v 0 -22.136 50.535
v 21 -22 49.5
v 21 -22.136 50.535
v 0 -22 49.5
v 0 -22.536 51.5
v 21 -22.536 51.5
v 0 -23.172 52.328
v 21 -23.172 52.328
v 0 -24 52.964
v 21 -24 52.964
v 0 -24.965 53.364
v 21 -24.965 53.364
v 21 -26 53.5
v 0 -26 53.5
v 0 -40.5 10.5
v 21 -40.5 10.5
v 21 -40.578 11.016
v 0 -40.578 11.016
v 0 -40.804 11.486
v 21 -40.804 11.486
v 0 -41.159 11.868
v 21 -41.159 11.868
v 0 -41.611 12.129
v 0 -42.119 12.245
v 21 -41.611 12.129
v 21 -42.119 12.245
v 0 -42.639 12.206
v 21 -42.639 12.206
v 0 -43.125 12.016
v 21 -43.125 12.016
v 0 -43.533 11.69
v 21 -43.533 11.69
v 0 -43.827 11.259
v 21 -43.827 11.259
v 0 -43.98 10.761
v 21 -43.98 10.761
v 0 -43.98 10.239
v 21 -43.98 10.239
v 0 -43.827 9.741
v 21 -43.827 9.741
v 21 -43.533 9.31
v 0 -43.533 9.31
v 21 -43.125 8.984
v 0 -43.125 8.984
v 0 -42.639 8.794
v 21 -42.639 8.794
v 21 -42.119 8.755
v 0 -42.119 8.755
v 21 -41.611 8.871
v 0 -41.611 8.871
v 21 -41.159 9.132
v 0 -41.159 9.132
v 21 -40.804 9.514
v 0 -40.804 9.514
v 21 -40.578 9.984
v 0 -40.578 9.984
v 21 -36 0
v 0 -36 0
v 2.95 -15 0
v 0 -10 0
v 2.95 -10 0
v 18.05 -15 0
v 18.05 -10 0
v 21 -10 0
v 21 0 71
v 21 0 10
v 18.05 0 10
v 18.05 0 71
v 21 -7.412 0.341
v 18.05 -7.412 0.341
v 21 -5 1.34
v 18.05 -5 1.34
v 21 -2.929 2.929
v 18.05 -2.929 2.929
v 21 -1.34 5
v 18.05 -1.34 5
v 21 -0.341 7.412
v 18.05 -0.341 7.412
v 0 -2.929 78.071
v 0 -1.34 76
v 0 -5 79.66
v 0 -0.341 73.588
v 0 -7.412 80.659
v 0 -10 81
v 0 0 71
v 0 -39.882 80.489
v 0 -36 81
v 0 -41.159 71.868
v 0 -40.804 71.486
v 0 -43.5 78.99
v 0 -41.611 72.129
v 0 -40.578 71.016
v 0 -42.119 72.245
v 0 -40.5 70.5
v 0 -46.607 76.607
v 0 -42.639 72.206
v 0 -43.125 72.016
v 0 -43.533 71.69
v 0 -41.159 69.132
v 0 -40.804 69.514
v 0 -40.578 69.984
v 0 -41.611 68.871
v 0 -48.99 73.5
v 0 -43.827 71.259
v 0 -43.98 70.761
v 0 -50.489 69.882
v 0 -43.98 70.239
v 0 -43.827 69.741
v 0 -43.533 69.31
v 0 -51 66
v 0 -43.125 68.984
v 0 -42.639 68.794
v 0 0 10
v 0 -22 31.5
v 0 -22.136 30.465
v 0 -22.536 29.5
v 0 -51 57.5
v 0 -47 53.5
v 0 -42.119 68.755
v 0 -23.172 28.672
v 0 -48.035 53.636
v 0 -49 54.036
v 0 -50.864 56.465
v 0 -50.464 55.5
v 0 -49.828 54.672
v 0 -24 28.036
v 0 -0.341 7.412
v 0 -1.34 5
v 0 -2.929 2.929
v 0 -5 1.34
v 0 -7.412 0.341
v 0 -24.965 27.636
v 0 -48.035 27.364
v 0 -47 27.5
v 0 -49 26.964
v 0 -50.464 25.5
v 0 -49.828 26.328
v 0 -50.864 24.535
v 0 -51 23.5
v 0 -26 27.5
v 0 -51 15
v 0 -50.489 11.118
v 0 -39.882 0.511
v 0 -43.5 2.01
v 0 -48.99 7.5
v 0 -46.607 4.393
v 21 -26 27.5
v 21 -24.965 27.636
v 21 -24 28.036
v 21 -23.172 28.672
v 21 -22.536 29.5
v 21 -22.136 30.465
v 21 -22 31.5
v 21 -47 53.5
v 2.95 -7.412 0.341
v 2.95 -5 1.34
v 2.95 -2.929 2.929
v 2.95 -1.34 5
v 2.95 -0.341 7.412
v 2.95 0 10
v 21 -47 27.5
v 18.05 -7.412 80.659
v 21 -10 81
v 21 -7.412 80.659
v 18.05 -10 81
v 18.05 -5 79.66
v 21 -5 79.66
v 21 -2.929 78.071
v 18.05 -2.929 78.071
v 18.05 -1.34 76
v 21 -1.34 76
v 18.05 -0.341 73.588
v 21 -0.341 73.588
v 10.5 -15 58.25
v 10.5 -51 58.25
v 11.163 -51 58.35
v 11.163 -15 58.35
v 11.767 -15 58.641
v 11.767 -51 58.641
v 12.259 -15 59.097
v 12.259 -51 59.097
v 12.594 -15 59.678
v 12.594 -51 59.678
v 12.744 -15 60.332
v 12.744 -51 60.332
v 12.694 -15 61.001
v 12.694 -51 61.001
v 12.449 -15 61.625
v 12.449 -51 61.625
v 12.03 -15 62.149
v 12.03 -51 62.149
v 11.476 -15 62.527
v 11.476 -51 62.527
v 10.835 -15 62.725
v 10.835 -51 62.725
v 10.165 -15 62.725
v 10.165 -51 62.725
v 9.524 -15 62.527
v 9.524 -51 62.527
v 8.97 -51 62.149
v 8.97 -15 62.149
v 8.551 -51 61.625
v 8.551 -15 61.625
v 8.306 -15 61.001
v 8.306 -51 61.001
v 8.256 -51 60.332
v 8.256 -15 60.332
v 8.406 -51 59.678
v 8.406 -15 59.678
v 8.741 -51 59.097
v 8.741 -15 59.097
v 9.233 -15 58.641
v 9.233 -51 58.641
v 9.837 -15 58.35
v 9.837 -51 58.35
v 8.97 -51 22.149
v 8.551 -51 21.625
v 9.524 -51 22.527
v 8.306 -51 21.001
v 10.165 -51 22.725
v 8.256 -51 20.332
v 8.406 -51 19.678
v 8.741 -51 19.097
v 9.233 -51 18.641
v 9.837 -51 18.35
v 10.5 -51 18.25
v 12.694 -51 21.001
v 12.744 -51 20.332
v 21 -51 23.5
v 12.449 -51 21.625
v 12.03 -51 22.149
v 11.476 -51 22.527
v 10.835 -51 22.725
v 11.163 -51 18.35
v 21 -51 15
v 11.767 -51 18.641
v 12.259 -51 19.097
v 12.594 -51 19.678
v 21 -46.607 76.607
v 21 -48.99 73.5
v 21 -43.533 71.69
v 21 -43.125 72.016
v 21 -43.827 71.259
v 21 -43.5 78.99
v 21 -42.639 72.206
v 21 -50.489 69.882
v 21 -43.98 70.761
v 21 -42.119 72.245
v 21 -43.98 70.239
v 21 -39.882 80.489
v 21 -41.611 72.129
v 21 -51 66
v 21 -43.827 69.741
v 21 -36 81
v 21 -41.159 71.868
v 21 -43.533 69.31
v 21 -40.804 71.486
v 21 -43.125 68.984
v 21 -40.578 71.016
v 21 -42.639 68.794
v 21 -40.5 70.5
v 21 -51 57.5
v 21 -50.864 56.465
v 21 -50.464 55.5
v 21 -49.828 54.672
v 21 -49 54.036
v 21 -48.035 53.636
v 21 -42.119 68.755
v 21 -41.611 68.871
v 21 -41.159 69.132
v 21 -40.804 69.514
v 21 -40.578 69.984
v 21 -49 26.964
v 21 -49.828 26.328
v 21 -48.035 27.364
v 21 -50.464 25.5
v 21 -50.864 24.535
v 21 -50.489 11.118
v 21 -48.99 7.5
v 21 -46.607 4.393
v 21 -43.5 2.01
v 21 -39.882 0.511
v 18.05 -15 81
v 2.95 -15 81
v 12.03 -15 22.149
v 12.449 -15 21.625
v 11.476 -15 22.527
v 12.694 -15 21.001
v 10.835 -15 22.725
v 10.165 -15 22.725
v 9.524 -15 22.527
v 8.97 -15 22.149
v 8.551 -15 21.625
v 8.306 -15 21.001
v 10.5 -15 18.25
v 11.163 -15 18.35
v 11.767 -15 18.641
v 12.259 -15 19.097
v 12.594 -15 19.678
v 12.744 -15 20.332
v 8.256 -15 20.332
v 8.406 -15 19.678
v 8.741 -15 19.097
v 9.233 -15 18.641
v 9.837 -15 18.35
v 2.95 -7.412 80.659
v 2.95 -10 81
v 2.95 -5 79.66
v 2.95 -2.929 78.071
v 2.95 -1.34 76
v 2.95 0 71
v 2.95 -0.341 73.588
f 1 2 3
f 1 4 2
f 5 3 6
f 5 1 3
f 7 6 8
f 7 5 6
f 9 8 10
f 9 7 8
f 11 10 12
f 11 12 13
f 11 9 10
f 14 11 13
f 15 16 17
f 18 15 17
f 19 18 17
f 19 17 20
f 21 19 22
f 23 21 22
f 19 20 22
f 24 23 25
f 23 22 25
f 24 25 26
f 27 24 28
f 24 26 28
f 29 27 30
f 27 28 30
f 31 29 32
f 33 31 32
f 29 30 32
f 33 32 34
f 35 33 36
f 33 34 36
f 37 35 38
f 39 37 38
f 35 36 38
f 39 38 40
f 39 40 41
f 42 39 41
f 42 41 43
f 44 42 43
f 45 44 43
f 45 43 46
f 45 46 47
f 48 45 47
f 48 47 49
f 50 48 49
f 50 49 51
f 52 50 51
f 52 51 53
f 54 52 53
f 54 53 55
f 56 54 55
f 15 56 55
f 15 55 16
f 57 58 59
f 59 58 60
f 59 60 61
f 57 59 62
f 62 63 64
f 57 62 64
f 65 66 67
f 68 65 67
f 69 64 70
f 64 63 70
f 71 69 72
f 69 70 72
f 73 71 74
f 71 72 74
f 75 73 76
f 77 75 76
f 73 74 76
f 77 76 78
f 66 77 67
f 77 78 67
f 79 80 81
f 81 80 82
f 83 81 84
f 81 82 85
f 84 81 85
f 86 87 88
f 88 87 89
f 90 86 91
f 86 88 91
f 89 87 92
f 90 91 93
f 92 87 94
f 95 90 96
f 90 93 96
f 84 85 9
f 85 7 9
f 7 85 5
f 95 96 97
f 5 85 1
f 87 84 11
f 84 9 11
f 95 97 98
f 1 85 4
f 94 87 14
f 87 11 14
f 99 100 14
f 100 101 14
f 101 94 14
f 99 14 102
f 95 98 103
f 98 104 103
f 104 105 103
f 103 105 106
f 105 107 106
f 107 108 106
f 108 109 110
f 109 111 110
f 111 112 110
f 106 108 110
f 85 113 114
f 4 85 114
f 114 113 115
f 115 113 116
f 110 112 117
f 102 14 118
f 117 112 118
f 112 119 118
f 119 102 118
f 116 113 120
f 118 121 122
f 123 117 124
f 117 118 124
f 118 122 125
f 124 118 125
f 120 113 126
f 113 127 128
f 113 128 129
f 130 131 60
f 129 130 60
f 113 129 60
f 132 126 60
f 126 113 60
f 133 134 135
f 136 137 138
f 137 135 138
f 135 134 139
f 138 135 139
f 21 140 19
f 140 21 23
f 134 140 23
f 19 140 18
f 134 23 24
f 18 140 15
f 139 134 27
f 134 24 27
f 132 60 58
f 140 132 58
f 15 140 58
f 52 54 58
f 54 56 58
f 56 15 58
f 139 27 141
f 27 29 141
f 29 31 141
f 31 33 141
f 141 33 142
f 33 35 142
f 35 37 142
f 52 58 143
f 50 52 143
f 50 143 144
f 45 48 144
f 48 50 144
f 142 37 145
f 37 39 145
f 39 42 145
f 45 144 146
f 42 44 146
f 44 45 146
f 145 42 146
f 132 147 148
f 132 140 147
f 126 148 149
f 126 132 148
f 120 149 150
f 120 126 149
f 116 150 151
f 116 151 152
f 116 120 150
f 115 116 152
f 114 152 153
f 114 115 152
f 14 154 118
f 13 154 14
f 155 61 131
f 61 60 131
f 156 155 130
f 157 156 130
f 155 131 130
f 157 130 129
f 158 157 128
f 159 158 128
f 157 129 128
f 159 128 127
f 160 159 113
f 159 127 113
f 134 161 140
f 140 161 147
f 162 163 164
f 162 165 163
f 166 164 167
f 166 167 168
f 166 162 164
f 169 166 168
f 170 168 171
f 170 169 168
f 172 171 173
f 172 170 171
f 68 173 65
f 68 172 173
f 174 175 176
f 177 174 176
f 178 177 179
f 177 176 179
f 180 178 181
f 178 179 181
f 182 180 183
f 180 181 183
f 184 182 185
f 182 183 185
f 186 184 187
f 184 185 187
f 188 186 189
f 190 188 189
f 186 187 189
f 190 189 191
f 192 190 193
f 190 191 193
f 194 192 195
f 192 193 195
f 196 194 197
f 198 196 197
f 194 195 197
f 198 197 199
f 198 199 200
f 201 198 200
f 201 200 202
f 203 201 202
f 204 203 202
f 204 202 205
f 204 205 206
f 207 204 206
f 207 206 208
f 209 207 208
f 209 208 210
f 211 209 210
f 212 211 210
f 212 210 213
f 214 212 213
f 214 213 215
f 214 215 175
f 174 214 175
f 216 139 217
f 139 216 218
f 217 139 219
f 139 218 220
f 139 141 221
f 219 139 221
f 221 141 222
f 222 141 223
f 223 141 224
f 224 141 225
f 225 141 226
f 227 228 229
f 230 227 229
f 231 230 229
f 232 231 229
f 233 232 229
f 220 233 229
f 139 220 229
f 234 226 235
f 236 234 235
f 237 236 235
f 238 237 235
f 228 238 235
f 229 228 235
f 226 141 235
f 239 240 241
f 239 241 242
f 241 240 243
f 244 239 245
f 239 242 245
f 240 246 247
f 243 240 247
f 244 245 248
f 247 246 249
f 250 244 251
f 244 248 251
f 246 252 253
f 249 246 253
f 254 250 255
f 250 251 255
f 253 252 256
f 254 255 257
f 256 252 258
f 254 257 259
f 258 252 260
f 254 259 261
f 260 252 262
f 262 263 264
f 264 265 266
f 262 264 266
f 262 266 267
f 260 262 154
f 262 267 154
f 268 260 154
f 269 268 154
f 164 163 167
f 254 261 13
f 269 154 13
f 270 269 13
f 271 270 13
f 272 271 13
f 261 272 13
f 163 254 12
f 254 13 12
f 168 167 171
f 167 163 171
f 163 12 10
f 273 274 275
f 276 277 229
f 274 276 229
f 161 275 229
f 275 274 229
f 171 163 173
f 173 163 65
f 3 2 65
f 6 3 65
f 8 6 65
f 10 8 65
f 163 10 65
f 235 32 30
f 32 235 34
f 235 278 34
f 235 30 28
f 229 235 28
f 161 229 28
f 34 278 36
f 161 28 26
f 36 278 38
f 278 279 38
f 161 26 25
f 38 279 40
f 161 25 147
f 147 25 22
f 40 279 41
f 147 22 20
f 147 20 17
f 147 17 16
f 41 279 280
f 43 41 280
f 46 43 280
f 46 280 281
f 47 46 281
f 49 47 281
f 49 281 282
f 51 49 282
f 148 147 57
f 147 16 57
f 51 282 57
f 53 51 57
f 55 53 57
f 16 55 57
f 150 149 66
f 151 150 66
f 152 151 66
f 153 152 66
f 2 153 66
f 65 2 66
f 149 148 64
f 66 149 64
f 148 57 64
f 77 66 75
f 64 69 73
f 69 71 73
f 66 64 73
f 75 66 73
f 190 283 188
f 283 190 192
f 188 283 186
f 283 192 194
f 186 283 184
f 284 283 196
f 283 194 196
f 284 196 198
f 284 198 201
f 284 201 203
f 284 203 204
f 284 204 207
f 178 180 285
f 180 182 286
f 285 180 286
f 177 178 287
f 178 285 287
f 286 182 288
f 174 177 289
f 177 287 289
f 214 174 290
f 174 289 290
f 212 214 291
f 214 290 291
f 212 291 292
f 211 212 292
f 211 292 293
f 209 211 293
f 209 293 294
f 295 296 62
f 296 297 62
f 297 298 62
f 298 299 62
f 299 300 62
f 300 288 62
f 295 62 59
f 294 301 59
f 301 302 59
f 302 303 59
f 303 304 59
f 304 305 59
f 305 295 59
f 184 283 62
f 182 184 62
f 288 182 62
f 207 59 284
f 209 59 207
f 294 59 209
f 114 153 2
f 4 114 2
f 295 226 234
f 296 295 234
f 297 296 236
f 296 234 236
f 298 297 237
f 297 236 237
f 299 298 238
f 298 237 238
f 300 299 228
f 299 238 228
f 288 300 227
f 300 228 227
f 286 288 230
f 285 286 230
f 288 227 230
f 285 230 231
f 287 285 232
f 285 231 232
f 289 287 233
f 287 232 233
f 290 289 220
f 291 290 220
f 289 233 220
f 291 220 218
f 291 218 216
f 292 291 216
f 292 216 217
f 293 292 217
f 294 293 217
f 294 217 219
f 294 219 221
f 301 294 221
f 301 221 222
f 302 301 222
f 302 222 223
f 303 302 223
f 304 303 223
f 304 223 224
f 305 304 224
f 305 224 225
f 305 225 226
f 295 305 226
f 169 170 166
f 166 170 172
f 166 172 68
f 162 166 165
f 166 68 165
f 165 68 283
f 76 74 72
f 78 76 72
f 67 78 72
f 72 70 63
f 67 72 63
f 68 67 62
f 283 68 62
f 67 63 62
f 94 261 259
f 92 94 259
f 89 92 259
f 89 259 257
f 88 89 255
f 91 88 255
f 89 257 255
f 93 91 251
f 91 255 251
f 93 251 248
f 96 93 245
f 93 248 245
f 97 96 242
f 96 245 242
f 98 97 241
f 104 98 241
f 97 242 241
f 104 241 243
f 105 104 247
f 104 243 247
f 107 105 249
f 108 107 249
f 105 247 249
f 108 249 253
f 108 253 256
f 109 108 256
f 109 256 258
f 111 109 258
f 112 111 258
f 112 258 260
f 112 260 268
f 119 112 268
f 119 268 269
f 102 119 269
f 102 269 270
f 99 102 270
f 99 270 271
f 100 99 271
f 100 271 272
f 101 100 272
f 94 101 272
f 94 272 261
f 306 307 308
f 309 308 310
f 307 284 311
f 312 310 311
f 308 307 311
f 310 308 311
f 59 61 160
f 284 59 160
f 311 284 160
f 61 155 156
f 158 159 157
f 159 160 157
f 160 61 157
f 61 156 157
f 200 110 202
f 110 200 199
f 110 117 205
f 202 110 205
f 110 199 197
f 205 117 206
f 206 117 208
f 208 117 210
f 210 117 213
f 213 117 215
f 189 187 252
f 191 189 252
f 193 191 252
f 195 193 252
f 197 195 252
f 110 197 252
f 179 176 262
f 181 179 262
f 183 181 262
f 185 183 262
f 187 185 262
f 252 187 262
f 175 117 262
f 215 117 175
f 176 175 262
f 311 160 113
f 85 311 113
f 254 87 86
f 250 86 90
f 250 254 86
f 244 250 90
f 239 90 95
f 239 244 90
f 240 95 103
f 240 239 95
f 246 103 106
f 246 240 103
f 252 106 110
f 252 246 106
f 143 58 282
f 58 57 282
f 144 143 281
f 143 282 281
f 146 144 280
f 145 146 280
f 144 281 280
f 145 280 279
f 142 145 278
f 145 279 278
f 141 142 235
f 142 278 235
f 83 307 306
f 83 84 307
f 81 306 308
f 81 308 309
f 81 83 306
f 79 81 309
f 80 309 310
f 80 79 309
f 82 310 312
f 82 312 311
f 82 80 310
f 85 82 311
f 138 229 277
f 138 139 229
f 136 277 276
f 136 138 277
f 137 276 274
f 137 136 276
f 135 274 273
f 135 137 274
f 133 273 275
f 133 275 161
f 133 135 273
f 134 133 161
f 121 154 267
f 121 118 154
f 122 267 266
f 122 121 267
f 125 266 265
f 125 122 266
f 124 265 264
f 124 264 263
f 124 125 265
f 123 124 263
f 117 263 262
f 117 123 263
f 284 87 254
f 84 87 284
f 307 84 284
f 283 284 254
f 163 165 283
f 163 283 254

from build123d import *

# Parameters (mm, degrees)
EXTRUDE_1_DEPTH     = 81
SKETCH_2_R          = 2.25
CUT_EXTRUDE_1_DEPTH = 82
SKETCH_3_R          = 1.75
CUT_EXTRUDE_2_DEPTH = 82
FILLET_1_R          = 10
FILLET_3_R          = 15
SKETCH_6_W          = 13
SKETCH_6_H          = 29
CUT_EXTRUDE_3_DEPTH = 55
FILLET_4_R          = 4


with BuildPart() as part:
    # 草图1 → 凸台-拉伸1 (new body)
    with BuildSketch(Plane.XY):
        Polygon((18.05, -15), (10.5, -15), (10.5, -51), (21, -51), (21, 0), (18.05, 0), align=None)
        Polygon((10.5, -51), (10.5, -15), (2.95, -15), (2.95, 0), (0, 0), (0, -51), align=None)
    extrude(amount=EXTRUDE_1_DEPTH)

    # 草图2 → 切除-拉伸1 (cut)
    with BuildSketch(Plane.XZ.offset(51)):
        with Locations(Location((10.5, 20.5, 0), (0, 0, 270))):
            Circle(SKETCH_2_R)
        with Locations(Location((10.5, 60.5, 0), (0, 0, 270))):
            Circle(SKETCH_2_R)
    extrude(amount=-CUT_EXTRUDE_1_DEPTH, mode=Mode.SUBTRACT)

    # 草图3 → 切除-拉伸2 (cut)
    with BuildSketch(Plane(origin=(21, 0, 0), x_dir=(0, 0, -1), z_dir=(1, 0, 0))):
        with Locations(Location((-70.5, -42.25, 0), (0, 0, 90))):
            Circle(SKETCH_3_R)
        with Locations(Location((-10.5, -42.25, 0), (0, 0, 90))):
            Circle(SKETCH_3_R)
    extrude(amount=-CUT_EXTRUDE_2_DEPTH, mode=Mode.SUBTRACT)

    # 圆角1
    fillet_1_edges = [part.edges().sort_by_distance(p)[0] for p in [
        (19.525, 0, 0),
        (1.475, 0, 0),
        (1.475, 0, 81),
        (19.525, 0, 81),
    ]]
    fillet(fillet_1_edges, radius=FILLET_1_R)

    # 圆角3
    fillet_3_edges = [part.edges().sort_by_distance(p)[0] for p in [
        (10.5, -51, 0),
        (10.5, -51, 81),
    ]]
    fillet(fillet_3_edges, radius=FILLET_3_R)

    # 草图6 → 切除-拉伸3 (cut)
    with BuildSketch(Plane(origin=(21, 0, 0), x_dir=(0, 0, -1), z_dir=(1, 0, 0))):
        with Locations((-34, -36.5)):
            Rectangle(SKETCH_6_W, SKETCH_6_H)
        with Locations((-47, -36.5)):
            Rectangle(SKETCH_6_W, SKETCH_6_H)
    extrude(amount=-CUT_EXTRUDE_3_DEPTH, mode=Mode.SUBTRACT)

    # 圆角4
    fillet_4_edges = [part.edges().sort_by_distance(p)[0] for p in [
        (10.5, -22, 53.5),
        (10.5, -22, 27.5),
        (10.5, -51, 27.5),
        (10.5, -51, 53.5),
    ]]
    fillet(fillet_4_edges, radius=FILLET_4_R)


solid = part.part
